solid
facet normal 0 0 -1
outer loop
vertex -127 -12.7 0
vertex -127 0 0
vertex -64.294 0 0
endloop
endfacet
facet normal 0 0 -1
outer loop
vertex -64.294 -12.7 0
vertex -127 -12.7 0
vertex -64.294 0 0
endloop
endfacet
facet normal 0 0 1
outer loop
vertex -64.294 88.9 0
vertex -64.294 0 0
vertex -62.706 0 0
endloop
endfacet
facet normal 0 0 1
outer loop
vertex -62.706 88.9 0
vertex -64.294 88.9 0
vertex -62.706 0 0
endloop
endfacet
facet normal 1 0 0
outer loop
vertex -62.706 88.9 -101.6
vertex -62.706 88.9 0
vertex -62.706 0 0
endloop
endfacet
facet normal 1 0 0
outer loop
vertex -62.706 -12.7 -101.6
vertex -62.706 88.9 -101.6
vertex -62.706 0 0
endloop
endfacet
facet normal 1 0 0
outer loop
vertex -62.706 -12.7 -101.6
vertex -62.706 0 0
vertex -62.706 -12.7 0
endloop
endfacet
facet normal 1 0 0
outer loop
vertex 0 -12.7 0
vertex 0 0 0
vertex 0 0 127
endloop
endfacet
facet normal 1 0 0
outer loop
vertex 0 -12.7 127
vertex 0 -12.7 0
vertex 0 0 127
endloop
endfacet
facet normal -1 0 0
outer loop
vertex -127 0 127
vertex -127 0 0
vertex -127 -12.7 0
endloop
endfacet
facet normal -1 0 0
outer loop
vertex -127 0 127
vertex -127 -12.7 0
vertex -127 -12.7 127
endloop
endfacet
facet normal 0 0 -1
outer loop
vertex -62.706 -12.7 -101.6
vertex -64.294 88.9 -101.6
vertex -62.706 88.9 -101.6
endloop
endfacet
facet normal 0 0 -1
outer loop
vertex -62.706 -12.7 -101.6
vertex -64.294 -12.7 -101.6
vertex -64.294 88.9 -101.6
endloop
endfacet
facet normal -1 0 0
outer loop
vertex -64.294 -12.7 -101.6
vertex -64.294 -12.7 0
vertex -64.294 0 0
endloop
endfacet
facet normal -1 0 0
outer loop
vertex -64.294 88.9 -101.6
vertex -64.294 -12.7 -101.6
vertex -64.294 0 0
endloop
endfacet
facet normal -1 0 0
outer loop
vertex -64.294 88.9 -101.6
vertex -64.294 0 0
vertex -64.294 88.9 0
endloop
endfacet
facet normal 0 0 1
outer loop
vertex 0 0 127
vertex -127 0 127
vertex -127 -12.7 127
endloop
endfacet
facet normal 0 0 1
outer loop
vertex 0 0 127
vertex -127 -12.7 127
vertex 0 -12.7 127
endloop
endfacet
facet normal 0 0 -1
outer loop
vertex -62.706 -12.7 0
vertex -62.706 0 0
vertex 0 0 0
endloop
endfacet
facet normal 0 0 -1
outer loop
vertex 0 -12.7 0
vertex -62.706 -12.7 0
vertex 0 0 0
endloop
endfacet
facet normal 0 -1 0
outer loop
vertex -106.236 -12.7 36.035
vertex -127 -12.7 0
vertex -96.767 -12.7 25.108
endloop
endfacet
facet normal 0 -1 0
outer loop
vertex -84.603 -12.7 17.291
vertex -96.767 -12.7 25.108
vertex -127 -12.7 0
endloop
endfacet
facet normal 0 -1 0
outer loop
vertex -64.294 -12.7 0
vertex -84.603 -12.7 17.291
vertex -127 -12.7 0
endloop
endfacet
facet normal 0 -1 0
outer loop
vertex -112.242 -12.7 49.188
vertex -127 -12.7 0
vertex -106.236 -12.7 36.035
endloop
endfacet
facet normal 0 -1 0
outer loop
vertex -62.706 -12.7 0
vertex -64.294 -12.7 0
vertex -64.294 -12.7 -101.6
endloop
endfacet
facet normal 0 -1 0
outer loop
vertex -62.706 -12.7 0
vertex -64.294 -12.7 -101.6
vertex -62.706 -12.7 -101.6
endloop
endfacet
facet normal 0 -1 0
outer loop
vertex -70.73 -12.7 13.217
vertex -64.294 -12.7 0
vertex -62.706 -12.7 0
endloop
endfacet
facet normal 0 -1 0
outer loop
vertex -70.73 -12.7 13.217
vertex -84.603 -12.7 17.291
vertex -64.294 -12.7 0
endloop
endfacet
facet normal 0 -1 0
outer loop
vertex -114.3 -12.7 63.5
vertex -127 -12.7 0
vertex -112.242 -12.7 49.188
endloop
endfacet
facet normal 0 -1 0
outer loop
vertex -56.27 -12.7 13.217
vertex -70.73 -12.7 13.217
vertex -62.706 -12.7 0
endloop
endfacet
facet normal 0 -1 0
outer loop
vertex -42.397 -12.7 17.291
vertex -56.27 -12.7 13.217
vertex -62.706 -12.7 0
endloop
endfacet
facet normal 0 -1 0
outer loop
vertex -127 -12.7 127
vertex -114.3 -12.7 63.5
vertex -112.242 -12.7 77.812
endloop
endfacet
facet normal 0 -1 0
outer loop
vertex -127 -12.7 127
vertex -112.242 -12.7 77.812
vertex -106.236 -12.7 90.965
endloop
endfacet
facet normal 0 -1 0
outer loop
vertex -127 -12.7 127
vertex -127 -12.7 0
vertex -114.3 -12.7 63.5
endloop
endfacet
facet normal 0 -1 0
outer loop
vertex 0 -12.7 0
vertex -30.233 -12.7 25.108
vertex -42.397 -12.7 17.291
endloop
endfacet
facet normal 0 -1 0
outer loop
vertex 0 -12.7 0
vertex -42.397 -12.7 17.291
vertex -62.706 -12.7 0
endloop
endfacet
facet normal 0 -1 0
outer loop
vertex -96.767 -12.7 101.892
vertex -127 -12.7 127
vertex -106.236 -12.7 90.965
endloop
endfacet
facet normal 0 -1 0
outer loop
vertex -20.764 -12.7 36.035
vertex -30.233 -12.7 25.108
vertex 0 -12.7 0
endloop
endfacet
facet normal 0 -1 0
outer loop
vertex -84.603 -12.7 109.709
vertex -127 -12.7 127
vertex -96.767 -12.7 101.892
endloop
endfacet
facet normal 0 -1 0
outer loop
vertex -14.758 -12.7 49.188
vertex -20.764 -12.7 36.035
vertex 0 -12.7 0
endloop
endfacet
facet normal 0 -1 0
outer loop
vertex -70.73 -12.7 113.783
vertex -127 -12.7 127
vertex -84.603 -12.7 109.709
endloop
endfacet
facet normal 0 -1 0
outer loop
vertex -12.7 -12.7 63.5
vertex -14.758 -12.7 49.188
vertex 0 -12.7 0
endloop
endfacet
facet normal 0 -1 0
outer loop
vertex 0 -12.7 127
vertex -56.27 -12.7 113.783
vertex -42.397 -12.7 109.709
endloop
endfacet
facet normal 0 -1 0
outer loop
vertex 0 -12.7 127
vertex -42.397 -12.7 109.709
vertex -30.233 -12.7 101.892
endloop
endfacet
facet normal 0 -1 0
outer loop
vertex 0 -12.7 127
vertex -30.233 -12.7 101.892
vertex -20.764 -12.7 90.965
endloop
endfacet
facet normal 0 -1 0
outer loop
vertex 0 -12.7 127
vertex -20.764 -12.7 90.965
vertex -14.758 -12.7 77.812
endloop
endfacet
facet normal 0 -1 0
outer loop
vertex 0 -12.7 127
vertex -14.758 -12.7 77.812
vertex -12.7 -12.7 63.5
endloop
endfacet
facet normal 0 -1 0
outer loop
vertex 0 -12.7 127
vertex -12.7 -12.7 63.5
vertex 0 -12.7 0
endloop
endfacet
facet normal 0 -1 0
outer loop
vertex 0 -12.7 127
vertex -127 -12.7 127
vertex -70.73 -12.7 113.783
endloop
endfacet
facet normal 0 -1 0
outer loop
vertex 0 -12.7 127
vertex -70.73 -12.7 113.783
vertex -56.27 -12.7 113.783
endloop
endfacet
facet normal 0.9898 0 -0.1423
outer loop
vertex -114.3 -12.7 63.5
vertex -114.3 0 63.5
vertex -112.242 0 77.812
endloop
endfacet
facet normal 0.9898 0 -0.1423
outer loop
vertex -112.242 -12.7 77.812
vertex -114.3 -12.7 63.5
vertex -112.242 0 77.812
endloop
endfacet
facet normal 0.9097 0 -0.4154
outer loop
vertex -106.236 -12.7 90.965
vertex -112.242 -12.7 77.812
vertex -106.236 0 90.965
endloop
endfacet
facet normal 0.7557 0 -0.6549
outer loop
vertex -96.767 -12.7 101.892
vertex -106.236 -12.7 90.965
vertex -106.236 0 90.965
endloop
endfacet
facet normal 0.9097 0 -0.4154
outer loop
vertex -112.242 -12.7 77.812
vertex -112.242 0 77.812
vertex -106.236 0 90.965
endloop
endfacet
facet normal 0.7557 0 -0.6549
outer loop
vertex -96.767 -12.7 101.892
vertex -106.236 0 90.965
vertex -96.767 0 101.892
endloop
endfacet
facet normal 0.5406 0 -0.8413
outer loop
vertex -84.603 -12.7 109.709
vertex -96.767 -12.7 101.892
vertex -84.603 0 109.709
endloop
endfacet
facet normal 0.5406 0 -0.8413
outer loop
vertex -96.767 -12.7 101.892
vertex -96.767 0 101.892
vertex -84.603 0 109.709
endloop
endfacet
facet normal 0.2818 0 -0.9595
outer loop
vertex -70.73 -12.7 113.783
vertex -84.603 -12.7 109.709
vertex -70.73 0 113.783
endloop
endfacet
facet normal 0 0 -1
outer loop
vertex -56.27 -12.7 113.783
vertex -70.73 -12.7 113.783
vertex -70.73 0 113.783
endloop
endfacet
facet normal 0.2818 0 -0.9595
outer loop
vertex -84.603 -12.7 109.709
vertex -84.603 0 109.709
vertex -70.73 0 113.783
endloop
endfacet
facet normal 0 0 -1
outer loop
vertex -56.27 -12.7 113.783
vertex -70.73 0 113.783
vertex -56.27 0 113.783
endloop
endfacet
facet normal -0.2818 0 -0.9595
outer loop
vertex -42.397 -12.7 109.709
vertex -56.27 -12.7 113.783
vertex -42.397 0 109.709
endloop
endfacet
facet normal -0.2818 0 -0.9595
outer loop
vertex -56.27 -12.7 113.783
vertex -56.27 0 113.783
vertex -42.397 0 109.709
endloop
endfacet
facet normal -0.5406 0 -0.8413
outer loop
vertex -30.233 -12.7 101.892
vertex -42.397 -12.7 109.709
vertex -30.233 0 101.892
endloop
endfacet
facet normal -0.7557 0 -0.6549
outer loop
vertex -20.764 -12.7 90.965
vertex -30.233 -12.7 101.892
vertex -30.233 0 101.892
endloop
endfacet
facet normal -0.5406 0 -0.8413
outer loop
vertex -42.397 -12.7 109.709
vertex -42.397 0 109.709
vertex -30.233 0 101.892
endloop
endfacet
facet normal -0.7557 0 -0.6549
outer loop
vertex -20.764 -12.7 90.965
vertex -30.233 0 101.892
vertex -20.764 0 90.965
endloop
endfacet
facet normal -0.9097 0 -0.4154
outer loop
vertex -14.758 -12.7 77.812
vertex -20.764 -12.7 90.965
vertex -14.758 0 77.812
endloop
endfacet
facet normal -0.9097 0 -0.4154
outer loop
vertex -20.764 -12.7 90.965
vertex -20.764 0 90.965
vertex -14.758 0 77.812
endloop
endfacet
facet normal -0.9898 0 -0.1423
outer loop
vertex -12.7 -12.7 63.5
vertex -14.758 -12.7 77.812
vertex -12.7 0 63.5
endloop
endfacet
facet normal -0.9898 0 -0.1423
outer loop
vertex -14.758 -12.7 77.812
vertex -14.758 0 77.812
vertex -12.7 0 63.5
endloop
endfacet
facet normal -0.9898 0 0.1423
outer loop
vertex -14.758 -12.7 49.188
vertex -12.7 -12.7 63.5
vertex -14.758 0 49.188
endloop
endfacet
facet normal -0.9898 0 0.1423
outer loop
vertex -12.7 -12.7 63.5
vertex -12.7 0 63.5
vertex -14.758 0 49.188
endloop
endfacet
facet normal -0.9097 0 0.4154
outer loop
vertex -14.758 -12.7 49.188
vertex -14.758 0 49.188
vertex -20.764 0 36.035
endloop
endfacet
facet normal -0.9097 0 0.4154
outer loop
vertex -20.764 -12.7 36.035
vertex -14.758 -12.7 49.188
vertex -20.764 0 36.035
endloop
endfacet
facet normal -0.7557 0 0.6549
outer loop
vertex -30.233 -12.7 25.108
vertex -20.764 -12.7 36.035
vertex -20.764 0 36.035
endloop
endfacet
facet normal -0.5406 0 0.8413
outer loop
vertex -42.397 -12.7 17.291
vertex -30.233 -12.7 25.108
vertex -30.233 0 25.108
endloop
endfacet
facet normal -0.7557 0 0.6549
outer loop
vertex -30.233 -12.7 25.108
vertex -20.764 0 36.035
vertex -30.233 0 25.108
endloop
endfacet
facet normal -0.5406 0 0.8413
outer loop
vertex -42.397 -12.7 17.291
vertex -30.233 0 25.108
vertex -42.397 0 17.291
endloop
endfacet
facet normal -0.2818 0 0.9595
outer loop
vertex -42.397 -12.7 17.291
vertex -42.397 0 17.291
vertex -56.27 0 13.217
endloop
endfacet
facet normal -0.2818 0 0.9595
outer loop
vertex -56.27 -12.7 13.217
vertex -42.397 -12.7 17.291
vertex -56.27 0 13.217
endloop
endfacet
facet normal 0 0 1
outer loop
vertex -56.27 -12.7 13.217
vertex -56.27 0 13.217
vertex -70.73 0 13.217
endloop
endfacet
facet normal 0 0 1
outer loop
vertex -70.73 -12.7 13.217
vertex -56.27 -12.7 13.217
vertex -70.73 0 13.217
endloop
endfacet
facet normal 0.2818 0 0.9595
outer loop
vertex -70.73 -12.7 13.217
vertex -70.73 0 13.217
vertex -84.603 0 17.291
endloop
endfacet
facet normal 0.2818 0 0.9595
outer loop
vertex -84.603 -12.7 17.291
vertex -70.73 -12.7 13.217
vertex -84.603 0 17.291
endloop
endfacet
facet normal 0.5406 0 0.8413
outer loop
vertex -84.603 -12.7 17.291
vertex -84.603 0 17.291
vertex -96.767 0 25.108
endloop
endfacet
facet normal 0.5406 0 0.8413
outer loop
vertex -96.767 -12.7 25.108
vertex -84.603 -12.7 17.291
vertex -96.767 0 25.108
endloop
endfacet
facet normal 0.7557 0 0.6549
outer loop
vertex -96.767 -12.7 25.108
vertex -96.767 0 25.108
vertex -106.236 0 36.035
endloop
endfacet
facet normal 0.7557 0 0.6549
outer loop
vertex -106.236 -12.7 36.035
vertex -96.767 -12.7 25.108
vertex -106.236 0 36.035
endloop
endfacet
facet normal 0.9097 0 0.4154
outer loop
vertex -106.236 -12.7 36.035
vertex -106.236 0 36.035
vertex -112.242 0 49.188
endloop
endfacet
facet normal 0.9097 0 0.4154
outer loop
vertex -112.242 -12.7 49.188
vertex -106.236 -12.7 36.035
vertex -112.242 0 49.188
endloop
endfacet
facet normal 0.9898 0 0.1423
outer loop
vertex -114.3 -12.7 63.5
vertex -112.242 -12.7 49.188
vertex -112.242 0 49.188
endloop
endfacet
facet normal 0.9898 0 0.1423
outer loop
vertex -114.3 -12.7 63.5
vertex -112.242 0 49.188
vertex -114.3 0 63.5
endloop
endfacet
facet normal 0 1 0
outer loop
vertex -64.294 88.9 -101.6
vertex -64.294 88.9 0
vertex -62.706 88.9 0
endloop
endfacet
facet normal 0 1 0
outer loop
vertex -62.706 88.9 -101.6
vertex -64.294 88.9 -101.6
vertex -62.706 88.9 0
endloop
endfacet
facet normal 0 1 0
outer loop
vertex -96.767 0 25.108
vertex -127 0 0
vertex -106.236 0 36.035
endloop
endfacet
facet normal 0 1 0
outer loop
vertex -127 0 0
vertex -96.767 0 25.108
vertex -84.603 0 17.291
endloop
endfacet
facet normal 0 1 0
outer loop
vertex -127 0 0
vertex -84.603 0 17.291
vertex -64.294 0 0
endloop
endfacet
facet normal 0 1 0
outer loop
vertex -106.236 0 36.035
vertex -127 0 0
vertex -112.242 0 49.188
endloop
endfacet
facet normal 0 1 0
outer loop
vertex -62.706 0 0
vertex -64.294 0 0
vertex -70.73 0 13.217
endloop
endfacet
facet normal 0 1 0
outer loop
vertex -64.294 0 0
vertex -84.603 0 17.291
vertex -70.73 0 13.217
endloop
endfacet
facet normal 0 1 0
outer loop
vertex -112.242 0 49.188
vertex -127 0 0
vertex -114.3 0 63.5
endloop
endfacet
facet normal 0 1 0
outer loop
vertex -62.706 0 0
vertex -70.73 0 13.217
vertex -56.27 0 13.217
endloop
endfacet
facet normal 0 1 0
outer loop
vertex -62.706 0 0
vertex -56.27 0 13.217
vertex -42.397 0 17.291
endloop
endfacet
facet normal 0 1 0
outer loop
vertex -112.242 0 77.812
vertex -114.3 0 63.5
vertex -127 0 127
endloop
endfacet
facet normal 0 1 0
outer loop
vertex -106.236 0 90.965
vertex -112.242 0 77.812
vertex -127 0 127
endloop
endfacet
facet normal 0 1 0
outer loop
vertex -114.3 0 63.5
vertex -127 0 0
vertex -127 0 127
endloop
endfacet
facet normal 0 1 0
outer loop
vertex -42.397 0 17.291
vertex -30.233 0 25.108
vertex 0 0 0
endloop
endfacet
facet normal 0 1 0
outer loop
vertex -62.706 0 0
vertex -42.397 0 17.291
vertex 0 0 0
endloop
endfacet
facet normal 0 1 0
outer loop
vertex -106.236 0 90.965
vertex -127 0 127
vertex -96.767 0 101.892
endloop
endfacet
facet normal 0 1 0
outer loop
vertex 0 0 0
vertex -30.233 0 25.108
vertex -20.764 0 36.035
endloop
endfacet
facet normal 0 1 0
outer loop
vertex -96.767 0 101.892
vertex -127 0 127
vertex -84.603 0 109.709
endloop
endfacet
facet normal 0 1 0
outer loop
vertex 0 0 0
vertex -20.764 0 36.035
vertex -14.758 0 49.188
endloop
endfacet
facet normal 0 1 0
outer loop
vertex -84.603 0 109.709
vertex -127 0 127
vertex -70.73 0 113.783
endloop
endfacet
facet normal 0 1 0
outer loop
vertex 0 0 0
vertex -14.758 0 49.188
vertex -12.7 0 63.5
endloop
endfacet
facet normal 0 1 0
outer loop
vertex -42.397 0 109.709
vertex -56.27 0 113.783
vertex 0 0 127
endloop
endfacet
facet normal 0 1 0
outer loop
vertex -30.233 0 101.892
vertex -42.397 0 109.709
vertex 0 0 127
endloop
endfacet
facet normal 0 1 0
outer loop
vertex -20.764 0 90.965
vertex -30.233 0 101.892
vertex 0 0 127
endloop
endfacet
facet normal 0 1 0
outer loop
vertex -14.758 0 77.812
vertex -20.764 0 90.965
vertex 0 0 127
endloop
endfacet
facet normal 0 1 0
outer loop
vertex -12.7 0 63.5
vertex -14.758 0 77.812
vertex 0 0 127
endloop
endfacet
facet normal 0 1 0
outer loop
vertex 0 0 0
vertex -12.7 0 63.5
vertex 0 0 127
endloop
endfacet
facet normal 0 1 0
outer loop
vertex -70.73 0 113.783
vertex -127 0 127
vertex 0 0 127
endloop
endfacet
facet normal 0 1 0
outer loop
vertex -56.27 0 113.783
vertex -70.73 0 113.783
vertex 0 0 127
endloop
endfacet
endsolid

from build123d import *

# Parameters (mm, degrees)
F0_W     = 127
F0_H     = 127
F1_DEPTH = 12.7
F3_D     = 101.6
F4_W     = 1.5875
F4_H     = 88.9
F4_H_2   = 12.7
F5_DEPTH = 101.6


with BuildPart() as f1:
    # F0 (on Front) → F1 (new body)
    with BuildSketch(Plane.XZ):
        with Locations((-63.5, 63.5)):
            Rectangle(F0_W, F0_H)
    extrude(amount=F1_DEPTH)

    # F3 (through all)
    with Locations(Plane.XZ.offset(12.7)):
        with Locations((-63.5, 63.5)):
            Hole(F3_D / 2)

    # F4 (on face) → F5 (join)
    with BuildSketch(Plane(origin=(0, 0, 0), x_dir=(1, 0, 0), z_dir=(0, 0, -1))):
        with Locations((-63.5, -44.45)):
            Rectangle(F4_W, F4_H)
        with Locations((-63.5, 6.35)):
            Rectangle(F4_W, F4_H_2)
    extrude(amount=F5_DEPTH)


solid = f1.part
